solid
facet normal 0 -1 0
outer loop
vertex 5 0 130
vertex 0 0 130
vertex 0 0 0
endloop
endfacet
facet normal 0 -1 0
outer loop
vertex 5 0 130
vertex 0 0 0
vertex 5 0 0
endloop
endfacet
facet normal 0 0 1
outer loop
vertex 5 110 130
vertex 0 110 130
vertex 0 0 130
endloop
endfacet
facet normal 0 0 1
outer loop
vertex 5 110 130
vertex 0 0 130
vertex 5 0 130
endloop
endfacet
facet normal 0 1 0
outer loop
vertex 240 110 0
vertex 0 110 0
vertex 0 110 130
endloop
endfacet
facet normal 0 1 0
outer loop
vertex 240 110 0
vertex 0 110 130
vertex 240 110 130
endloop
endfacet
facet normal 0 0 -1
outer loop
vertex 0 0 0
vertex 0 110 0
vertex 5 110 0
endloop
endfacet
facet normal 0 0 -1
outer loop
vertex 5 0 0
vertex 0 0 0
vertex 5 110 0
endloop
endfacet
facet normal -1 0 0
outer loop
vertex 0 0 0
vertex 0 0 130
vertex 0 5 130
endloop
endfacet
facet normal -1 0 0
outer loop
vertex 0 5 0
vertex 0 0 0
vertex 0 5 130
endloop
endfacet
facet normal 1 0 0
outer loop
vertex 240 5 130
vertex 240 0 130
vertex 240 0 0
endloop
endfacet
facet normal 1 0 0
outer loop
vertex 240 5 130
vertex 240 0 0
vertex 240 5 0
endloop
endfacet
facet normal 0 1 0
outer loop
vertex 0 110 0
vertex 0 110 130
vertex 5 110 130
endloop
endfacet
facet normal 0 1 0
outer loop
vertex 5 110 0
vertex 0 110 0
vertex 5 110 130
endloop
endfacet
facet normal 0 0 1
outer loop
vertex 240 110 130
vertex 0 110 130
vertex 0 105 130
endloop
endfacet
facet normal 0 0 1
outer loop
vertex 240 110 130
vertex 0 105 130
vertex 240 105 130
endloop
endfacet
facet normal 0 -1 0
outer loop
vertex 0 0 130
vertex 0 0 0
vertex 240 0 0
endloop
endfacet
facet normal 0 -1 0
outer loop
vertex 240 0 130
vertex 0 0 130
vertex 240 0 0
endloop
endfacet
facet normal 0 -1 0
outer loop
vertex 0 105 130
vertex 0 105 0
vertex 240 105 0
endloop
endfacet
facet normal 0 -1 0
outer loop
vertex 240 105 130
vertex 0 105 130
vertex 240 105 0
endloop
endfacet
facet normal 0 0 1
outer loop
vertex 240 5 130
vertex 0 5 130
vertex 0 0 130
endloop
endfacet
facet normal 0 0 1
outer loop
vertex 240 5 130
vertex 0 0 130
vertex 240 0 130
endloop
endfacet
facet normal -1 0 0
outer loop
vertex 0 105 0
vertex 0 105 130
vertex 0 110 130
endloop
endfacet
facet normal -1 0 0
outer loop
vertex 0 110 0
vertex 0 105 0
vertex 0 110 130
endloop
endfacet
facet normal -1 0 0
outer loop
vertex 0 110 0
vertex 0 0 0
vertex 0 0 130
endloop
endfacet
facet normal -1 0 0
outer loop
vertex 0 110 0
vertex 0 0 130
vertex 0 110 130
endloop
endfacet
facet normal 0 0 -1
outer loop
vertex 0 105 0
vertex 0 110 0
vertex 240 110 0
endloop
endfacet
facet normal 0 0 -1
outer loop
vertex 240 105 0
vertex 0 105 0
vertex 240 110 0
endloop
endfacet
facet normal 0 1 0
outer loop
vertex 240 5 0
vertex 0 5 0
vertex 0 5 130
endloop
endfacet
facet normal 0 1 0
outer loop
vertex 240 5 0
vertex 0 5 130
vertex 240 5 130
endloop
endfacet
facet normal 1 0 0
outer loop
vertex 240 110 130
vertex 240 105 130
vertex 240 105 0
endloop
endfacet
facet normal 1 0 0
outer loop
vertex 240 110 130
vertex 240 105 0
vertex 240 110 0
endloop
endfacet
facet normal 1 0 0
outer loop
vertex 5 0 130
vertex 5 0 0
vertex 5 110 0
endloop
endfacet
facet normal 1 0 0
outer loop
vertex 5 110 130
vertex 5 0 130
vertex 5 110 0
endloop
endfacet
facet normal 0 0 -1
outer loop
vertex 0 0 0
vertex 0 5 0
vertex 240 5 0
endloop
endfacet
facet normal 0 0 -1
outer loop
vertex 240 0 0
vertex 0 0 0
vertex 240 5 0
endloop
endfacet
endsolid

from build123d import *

# Parameters (mm, degrees)
BOX004_W     = 5
BOX004_H     = 110
BOX004_DEPTH = 130
BOX002_W     = 240
BOX002_H     = 5
BOX002_DEPTH = 130
BOX003_W     = 240
BOX003_H     = 5
BOX003_DEPTH = 130


with BuildPart() as cube004:
    # Box004 → Box004 (new body)
    with BuildSketch(Plane.XY):
        with Locations((2.5, 55)):
            Rectangle(BOX004_W, BOX004_H)
    extrude(amount=BOX004_DEPTH)


with BuildPart() as cube002:
    # Box002 → Box002 (new body)
    with BuildSketch(Plane(origin=(0, 105, 0), x_dir=(1, 0, 0), z_dir=(0, 0, 1))):
        with Locations((120, 2.5)):
            Rectangle(BOX002_W, BOX002_H)
    extrude(amount=BOX002_DEPTH)


with BuildPart() as cube003:
    # Box003 → Box003 (new body)
    with BuildSketch(Plane.XY):
        with Locations((120, 2.5)):
            Rectangle(BOX003_W, BOX003_H)
    extrude(amount=BOX003_DEPTH)


solid = Compound([cube004.part, cube002.part, cube003.part])
